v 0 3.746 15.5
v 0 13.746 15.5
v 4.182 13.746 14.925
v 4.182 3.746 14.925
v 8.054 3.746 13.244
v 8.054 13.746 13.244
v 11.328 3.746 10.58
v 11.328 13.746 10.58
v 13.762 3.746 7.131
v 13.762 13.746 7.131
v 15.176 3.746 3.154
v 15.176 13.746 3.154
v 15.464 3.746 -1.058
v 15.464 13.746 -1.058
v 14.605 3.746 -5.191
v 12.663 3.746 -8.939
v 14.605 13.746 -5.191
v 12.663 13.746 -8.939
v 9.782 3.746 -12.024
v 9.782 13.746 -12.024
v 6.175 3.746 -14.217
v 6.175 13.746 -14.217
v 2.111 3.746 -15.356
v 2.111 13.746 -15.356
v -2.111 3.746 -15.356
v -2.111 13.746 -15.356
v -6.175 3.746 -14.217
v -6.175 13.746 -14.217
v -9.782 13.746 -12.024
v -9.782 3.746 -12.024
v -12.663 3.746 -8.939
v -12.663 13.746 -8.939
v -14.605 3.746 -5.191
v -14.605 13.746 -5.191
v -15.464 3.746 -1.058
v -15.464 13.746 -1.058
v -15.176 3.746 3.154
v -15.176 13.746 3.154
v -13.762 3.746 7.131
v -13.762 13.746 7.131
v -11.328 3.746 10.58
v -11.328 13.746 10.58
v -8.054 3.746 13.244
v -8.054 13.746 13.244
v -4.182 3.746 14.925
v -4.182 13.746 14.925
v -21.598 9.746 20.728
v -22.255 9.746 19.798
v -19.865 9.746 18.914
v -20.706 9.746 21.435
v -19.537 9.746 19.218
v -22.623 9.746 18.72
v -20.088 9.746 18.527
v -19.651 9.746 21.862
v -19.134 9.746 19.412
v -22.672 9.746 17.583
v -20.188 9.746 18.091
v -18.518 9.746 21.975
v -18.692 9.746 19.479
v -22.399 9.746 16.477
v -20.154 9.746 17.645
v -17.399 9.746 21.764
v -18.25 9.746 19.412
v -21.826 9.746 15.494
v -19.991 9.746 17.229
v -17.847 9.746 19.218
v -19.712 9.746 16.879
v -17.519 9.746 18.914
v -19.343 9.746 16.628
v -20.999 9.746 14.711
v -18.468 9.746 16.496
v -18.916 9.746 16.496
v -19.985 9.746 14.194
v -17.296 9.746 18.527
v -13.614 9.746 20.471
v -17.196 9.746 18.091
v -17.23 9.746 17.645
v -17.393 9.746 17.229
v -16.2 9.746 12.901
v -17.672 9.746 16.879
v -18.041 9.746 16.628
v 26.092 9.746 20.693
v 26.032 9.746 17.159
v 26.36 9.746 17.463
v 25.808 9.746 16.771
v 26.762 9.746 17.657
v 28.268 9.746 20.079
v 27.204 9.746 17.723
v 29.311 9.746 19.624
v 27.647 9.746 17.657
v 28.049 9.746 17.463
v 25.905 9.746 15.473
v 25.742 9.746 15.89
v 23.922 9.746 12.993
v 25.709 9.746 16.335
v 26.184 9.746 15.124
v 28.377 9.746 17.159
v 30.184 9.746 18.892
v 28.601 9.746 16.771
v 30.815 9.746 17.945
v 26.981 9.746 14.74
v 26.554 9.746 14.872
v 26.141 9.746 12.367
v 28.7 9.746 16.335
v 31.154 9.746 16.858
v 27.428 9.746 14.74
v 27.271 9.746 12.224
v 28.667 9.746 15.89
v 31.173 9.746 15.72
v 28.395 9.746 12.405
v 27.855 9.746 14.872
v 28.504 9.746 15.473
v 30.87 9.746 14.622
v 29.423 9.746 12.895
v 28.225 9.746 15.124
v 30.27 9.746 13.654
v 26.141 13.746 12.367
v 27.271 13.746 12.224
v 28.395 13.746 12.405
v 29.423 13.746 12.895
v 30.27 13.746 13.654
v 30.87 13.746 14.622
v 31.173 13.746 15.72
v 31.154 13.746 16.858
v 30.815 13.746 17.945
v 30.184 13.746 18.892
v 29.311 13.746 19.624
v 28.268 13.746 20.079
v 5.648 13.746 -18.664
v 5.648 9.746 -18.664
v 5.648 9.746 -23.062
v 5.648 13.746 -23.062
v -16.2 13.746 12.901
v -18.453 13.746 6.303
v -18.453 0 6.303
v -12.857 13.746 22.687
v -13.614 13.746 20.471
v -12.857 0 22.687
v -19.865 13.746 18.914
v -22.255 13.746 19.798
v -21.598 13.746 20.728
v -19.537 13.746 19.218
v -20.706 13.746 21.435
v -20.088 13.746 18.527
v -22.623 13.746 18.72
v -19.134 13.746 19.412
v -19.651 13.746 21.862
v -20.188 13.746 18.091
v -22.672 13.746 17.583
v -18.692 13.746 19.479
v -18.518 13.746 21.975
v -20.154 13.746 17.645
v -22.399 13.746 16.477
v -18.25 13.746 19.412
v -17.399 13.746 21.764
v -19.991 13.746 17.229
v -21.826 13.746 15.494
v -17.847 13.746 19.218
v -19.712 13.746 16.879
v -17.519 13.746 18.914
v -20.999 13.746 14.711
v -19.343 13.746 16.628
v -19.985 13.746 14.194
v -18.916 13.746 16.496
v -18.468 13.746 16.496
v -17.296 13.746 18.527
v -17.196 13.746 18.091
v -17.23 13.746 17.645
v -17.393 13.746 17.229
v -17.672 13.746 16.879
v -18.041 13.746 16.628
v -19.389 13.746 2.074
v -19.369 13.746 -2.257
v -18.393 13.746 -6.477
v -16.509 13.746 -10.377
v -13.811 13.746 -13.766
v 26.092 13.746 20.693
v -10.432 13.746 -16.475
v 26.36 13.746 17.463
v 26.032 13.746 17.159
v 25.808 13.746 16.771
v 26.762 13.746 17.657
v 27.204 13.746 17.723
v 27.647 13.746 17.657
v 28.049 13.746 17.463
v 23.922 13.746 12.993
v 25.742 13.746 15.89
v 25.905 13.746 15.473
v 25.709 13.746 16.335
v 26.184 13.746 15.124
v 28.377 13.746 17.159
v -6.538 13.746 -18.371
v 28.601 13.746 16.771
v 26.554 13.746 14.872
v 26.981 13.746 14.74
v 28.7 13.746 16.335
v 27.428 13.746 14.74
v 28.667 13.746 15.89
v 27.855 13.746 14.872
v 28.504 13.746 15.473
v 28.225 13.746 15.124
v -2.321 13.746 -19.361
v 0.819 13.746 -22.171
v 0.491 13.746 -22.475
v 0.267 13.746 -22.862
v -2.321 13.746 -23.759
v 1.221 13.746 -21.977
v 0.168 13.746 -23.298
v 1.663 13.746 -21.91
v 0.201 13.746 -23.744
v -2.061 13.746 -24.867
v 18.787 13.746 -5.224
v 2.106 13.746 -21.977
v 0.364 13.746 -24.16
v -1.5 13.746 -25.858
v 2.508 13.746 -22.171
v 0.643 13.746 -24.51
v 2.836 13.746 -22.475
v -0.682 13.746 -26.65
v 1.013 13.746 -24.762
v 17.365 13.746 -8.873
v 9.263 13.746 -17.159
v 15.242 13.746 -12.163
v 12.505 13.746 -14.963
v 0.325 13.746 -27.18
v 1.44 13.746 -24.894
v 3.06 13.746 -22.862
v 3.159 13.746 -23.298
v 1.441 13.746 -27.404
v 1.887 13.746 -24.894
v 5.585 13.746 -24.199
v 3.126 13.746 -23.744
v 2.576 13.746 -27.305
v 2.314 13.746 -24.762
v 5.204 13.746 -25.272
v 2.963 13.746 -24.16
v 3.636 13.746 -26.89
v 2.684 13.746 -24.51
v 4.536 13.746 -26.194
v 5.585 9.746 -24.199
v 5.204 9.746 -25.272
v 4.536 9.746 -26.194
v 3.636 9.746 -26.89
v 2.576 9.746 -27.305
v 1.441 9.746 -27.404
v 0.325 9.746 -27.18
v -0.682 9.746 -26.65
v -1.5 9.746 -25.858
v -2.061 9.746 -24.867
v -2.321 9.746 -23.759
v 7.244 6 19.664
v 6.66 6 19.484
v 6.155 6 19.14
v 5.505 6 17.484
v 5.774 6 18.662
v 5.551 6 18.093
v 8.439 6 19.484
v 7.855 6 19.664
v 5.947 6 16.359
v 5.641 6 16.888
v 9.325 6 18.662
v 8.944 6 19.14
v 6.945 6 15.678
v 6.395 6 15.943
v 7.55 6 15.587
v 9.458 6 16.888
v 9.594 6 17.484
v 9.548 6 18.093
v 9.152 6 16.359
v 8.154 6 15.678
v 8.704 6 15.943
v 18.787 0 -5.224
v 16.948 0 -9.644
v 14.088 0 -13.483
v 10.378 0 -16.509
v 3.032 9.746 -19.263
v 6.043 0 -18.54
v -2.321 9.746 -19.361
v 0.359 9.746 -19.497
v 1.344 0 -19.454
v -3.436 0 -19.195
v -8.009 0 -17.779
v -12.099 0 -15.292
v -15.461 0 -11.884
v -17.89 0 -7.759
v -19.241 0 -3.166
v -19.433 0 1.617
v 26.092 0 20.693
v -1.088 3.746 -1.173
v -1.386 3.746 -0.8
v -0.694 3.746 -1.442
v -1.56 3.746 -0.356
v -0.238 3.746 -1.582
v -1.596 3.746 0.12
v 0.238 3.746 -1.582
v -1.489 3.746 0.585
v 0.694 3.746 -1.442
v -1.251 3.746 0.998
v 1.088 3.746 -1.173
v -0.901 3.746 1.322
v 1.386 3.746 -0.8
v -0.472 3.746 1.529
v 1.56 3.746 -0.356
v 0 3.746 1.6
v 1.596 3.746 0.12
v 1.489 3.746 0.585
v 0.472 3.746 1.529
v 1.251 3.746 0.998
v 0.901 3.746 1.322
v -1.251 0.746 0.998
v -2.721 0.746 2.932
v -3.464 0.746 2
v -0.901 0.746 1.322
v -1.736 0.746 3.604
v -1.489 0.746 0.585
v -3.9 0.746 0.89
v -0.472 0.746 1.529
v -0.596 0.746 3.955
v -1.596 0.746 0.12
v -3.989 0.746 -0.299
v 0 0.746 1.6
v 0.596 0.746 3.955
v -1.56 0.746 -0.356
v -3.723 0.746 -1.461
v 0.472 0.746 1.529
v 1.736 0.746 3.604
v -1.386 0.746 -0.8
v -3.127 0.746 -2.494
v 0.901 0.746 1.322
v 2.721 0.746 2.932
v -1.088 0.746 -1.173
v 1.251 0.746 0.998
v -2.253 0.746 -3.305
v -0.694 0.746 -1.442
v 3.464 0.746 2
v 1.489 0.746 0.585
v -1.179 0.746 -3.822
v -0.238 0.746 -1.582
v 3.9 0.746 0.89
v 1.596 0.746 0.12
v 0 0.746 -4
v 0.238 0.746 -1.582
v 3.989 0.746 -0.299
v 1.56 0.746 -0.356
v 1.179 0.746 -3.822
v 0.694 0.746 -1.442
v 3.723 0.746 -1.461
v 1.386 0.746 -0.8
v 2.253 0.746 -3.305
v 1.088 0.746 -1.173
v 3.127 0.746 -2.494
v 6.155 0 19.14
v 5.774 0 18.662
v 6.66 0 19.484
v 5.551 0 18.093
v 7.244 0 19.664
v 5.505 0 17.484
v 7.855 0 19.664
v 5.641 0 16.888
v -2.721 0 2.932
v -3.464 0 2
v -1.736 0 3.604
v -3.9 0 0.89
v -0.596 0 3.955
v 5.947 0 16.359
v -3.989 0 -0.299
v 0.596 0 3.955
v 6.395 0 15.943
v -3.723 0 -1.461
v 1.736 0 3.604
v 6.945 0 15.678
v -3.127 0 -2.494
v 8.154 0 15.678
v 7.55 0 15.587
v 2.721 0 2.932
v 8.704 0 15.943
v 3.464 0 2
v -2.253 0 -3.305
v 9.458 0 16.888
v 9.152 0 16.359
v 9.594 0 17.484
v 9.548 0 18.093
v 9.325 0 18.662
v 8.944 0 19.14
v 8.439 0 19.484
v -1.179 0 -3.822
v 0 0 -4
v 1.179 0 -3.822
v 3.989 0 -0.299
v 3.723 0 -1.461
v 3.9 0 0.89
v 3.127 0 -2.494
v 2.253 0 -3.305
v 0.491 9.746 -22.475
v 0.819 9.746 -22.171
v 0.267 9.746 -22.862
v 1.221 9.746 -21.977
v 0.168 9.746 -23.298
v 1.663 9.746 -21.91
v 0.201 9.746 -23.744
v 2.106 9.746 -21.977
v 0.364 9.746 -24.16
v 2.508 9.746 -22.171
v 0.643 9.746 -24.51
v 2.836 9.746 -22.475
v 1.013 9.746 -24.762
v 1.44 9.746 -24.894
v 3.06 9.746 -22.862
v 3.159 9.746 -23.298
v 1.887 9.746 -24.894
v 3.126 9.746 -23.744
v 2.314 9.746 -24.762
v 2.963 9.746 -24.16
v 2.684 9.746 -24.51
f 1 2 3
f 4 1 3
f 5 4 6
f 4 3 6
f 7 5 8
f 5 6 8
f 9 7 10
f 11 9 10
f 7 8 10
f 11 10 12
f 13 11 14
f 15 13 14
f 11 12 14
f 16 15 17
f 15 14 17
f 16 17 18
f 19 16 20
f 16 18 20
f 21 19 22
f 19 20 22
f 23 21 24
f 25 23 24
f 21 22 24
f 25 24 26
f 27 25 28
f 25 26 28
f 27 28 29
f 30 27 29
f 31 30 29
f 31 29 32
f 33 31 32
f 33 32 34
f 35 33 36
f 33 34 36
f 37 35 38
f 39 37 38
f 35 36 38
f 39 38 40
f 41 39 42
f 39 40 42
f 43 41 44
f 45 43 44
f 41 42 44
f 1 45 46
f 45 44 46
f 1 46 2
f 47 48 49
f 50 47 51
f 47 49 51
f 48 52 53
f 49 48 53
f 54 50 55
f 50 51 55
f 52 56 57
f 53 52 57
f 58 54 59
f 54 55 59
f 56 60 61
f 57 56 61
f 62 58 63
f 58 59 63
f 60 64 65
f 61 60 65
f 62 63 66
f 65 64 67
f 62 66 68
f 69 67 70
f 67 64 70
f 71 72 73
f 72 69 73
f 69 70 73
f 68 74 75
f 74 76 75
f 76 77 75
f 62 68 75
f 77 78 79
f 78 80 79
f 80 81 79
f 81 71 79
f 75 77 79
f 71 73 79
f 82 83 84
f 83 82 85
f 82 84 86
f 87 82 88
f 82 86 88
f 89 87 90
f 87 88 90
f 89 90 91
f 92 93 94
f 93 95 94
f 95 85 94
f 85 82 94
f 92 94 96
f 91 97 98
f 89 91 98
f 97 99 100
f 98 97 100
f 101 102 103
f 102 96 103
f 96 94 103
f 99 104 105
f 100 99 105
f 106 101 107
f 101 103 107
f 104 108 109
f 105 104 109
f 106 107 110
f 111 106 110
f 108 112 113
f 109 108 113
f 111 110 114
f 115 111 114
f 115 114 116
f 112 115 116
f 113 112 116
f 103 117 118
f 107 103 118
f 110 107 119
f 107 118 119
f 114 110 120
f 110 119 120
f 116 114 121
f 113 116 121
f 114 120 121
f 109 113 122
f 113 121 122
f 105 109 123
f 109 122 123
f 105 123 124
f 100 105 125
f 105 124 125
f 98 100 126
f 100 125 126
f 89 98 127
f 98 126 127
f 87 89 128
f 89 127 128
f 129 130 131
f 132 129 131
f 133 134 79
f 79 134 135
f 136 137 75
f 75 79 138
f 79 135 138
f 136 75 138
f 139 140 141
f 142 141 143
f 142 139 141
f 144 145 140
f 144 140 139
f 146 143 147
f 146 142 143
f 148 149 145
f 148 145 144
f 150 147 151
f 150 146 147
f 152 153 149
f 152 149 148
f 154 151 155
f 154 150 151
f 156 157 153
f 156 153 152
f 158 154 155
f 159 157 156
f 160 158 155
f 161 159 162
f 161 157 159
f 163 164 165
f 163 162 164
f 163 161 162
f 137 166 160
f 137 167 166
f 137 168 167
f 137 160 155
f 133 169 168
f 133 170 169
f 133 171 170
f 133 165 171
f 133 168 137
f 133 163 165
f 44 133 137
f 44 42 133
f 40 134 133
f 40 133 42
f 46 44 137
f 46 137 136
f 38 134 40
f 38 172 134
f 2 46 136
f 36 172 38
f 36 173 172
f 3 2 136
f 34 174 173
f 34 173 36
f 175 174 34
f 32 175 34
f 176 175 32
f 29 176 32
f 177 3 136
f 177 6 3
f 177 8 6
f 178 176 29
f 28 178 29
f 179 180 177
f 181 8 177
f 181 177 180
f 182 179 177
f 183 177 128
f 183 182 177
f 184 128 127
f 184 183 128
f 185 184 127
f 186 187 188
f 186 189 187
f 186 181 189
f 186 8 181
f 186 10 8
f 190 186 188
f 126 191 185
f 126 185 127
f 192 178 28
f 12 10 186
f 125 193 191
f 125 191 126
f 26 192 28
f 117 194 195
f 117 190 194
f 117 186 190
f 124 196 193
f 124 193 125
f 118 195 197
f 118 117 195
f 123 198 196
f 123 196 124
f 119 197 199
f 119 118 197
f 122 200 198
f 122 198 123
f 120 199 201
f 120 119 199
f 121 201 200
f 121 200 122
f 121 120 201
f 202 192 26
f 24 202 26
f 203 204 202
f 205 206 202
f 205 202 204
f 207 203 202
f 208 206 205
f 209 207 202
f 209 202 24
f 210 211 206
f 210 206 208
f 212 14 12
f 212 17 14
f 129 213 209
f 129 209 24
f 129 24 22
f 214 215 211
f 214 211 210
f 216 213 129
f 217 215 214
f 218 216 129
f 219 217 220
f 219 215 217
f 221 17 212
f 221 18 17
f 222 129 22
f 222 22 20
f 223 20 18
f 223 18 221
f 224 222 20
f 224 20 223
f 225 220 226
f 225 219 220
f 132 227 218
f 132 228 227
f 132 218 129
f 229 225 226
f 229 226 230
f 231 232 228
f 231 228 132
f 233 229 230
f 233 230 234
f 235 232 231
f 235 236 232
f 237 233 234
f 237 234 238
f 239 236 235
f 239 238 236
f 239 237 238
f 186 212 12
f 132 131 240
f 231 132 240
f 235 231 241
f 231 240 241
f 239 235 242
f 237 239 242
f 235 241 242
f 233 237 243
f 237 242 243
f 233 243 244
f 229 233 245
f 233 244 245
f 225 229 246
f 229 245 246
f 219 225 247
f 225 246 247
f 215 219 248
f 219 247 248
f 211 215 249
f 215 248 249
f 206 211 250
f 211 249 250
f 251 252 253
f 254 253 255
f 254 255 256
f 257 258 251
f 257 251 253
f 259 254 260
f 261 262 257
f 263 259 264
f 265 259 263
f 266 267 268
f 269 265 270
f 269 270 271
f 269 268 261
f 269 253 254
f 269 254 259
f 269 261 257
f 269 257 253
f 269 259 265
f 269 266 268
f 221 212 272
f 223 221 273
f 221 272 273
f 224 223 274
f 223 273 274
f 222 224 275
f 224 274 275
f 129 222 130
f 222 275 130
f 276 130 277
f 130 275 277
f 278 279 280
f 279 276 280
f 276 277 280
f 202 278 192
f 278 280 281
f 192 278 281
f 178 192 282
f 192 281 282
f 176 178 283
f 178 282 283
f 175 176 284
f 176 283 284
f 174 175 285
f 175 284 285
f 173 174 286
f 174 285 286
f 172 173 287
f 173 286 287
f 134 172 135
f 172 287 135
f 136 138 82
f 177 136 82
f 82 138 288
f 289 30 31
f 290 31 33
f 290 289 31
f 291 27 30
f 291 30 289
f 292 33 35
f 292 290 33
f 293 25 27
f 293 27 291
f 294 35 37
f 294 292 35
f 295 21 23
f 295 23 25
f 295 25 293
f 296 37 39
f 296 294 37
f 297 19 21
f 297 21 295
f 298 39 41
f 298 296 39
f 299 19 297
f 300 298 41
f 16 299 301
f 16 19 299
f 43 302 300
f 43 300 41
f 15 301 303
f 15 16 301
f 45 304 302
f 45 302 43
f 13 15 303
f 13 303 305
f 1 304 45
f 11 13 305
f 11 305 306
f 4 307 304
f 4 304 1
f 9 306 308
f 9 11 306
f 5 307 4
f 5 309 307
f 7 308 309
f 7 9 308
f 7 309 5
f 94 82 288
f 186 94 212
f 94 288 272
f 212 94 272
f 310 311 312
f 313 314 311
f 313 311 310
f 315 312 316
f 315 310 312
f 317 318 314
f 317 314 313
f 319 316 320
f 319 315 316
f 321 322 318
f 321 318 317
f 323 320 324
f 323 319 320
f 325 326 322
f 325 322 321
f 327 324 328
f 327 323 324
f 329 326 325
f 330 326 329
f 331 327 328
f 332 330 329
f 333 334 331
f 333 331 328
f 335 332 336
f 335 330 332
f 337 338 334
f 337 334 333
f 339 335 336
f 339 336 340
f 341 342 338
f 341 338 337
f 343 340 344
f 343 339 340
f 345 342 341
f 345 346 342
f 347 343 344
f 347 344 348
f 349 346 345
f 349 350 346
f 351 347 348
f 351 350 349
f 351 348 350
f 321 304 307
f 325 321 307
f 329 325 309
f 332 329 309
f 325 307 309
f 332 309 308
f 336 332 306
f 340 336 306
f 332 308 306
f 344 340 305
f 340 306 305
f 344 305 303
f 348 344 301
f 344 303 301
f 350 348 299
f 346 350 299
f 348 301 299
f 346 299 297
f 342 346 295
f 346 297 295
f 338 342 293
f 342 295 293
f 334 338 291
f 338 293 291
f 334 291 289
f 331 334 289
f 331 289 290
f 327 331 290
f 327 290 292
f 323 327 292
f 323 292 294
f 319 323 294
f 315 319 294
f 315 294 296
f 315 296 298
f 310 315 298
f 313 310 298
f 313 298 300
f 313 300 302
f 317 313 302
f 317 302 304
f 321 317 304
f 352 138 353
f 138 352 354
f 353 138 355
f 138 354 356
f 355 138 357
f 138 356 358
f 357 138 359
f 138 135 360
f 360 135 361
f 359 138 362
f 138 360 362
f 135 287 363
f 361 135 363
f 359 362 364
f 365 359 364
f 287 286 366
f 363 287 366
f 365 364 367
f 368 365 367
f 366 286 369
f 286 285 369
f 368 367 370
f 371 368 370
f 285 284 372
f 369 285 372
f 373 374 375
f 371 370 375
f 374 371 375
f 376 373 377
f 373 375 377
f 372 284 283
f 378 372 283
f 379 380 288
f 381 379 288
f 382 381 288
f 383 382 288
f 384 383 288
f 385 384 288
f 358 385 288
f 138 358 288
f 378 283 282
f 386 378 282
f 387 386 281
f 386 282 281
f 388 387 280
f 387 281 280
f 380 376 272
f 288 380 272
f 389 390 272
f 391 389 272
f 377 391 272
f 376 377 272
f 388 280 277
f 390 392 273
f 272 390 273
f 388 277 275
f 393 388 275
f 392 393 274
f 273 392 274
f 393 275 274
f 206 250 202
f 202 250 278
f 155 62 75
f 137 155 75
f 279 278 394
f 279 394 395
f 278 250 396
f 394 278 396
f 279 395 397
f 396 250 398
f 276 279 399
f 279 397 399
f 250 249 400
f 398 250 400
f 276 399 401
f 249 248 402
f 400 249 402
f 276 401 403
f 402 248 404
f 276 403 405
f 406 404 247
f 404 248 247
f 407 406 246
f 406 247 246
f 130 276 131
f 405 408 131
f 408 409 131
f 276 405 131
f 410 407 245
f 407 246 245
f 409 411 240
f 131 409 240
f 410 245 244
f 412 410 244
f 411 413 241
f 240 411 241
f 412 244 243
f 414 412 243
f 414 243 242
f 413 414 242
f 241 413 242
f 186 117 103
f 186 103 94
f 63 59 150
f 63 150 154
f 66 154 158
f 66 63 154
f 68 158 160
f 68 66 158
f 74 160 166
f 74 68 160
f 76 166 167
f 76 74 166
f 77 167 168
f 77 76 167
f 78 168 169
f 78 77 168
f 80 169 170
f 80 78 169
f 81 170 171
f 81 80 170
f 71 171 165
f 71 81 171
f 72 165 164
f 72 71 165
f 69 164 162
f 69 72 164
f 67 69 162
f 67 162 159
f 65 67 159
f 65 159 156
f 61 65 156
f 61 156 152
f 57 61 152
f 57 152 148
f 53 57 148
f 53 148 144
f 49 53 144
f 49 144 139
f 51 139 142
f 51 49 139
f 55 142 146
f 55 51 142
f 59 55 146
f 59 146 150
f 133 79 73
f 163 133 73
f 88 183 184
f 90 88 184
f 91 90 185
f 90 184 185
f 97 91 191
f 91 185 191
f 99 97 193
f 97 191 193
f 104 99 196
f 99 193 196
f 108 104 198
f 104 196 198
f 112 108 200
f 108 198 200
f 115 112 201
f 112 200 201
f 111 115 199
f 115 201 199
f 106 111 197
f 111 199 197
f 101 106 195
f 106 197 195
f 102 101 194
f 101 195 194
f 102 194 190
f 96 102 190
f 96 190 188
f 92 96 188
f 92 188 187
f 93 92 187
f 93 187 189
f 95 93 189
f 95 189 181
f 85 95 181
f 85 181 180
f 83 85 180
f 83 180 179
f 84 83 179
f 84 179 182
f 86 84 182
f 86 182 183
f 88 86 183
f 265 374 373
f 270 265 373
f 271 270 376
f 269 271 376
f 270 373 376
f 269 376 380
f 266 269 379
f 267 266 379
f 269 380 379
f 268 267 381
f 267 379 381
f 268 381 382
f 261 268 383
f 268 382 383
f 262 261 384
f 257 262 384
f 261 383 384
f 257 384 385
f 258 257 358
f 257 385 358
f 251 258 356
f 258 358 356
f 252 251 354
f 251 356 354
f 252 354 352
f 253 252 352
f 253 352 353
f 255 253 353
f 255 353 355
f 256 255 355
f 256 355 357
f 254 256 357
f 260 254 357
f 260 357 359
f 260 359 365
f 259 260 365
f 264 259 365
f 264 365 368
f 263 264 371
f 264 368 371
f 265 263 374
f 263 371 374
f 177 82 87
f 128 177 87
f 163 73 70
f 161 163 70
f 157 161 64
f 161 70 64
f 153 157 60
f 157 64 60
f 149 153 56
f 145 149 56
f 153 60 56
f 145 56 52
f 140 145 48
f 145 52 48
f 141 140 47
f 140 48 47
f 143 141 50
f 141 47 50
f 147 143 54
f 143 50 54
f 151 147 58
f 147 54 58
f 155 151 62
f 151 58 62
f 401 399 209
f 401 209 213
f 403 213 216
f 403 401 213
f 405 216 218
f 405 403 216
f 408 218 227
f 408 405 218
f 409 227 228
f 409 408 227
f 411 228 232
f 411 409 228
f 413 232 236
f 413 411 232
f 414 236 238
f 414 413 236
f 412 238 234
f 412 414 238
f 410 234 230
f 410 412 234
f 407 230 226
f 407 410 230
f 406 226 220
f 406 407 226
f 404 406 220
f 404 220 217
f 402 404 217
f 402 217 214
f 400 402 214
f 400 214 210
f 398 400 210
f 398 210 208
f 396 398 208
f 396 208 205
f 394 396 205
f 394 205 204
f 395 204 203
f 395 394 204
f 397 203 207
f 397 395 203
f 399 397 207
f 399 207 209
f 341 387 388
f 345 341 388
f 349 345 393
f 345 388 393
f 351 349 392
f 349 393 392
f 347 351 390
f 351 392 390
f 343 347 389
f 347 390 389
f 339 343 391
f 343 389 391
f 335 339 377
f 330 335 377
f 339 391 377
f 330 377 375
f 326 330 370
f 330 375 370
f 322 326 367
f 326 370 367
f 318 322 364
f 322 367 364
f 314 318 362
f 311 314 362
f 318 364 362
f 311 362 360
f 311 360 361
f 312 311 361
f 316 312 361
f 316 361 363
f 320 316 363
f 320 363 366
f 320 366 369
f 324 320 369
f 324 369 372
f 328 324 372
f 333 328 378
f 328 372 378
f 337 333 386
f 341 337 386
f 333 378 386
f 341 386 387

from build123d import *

# Parameters (mm, degrees)
SALIENTE_EXTRUIR1_DEPTH = 13.746
CROQUIS2_R              = 15.5
CORTAR_EXTRUIR1_DEPTH   = 10
CROQUIS3_R              = 1.6
CORTAR_EXTRUIR2_DEPTH   = 10
SALIENTE_EXTRUIR2_START = -4
CROQUIS4_R              = 1.5
SALIENTE_EXTRUIR2_DEPTH = 4
CORTAR_EXTRUIR3_DEPTH   = 45.978374576
CROQUIS6_R              = 1.5
CORTAR_EXTRUIR4_DEPTH   = 44.749194214
CROQUIS7_R              = 2.05
CORTAR_EXTRUIR5_DEPTH   = 6
CROQUIS8_R              = 4
CORTAR_EXTRUIR6_DEPTH   = 0.746


# Read off the part's stored shape, not the designer's step: Saliente-Extruir1
with BuildPart() as part:
    # Saliente-Extruir1 outline → Saliente-Extruir1 (new body)
    with BuildSketch(Plane(origin=(0, 0, 0), x_dir=(1, 0, 0), z_dir=(0, 1, 0))):
        with BuildLine():
            Line((26.09194434, -20.692720824), (18.78711178, 5.224407236))
            ThreePointArc((18.78711178, 5.224407236), (-5.766161796, 18.627973001), (-18.453215474, -6.30308168))
            Line((-18.453215474, -6.30308168), (-12.857048648, -22.686698065))
            Line((-12.857048648, -22.686698065), (26.09194434, -20.692720824))
        make_face()
    extrude(amount=SALIENTE_EXTRUIR1_DEPTH)

    # Croquis2 → Cortar-Extruir1 (cut)
    with BuildSketch(Plane(origin=(0, 13.746, 0), x_dir=(1, 0, 0), z_dir=(0, 1, 0))):
        with Locations(Location((0, 0, 0), (0, 0, 270))):
            Circle(CROQUIS2_R)
    extrude(amount=-CORTAR_EXTRUIR1_DEPTH, mode=Mode.SUBTRACT)

    # Croquis3 → Cortar-Extruir2 (cut)
    with BuildSketch(Plane(origin=(0, 3.746, 0), x_dir=(1, 0, 0), z_dir=(0, 1, 0))):
        with Locations(Location((0, 0, 0), (0, 0, 270))):
            Circle(CROQUIS3_R)
    extrude(amount=-CORTAR_EXTRUIR2_DEPTH, mode=Mode.SUBTRACT)

    # Croquis4 → Saliente-Extruir2 (add)
    # profile 1 of 3: a face of its own
    with BuildSketch(Plane(origin=(0, 13.746, 0), x_dir=(1, 0, 0), z_dir=(0, 1, 0)).offset(SALIENTE_EXTRUIR2_START)):
        with BuildLine():
            Line((-17.399016653, -21.764305721), (-13.613741684, -20.471365889))
            Line((-13.613741684, -20.471365889), (-16.199621348, -12.900815951))
            Line((-16.199621348, -12.900815951), (-19.984896317, -14.193755782))
            ThreePointArc((-19.984896317, -14.193755782), (-22.477231454, -19.271970583), (-17.399016653, -21.764305721))
        make_face()
        with Locations(Location((-18.691956485, -17.979030752, 0), (0, 0, 270))):
            Circle(CROQUIS4_R, mode=Mode.SUBTRACT)
    # profile 2 of 3: a face of its own
    with BuildSketch(Plane(origin=(0, 13.746, 0), x_dir=(1, 0, 0), z_dir=(0, 1, 0)).offset(SALIENTE_EXTRUIR2_START)):
        with BuildLine():
            Line((23.921673943, -12.992725603), (26.09194434, -20.692720824))
            Line((26.09194434, -20.692720824), (29.941941951, -19.607585626))
            ThreePointArc((29.941941951, -19.607585626), (32.75563819, -14.658688833), (27.771671554, -11.907590405))
            Line((27.771671554, -11.907590405), (23.921673943, -12.992725603))
        make_face()
    # profile 3 of 3: a face of its own
    with BuildSketch(Plane(origin=(0, 13.746, 0), x_dir=(1, 0, 0), z_dir=(0, 1, 0)).offset(SALIENTE_EXTRUIR2_START)):
        with BuildLine():
            Line((-2.321, 23.759), (-2.321, 19.361378024))
            ThreePointArc((-2.321, 19.361378024), (1.699637522, 19.425787816), (5.648, 18.664139305))
            Line((5.648, 18.664139305), (5.648, 23.062))
            ThreePointArc((5.648, 23.062), (2.012, 27.395), (-2.321, 23.759))
        make_face()
        with Locations(Location((1.6635, 23.4105, 0), (0, 0, 270))):
            Circle(CROQUIS4_R, mode=Mode.SUBTRACT)
    extrude(amount=SALIENTE_EXTRUIR2_DEPTH)

    # Croquis5 → Cortar-Extruir3 (cut, through all)
    with BuildSketch(Plane(origin=(0, 13.746, 0), x_dir=(1, 0, 0), z_dir=(0, 1, 0))):
        with BuildLine():
            Line((25.521809268, -10.120190748), (26.141320794, -12.367178003))
            ThreePointArc((26.141320794, -12.367178003), (31.060606452, -15.160138551), (28.267645904, -20.079424208))
            Line((28.267645904, -20.079424208), (28.88715743, -22.326411463))
            ThreePointArc((28.88715743, -22.326411463), (33.307593706, -14.540627024), (25.521809268, -10.120190748))
        make_face()
    extrude(amount=-CORTAR_EXTRUIR3_DEPTH, mode=Mode.SUBTRACT)

    # Croquis6 → Cortar-Extruir4 (cut, through all)
    with BuildSketch(Plane(origin=(0, 13.746, 0), x_dir=(1, 0, 0), z_dir=(0, 1, 0))):
        with Locations(Location((27.204483349, -16.223301105, 0), (0, 0, 270))):
            Circle(CROQUIS6_R)
    extrude(amount=-CORTAR_EXTRUIR4_DEPTH, mode=Mode.SUBTRACT)

    # Croquis7 → Cortar-Extruir5 (cut)
    with BuildSketch(Plane.XZ):
        with Locations(Location((7.549608222, 17.636749548, 0), (0, 0, 270))):
            Circle(CROQUIS7_R)
    extrude(amount=-CORTAR_EXTRUIR5_DEPTH, mode=Mode.SUBTRACT)

    # Croquis8 → Cortar-Extruir6 (cut)
    with BuildSketch(Plane.XZ):
        with Locations(Location((0, 0, 0), (0, 0, 270))):
            Circle(CROQUIS8_R)
    extrude(amount=-CORTAR_EXTRUIR6_DEPTH, mode=Mode.SUBTRACT)


solid = part.part
